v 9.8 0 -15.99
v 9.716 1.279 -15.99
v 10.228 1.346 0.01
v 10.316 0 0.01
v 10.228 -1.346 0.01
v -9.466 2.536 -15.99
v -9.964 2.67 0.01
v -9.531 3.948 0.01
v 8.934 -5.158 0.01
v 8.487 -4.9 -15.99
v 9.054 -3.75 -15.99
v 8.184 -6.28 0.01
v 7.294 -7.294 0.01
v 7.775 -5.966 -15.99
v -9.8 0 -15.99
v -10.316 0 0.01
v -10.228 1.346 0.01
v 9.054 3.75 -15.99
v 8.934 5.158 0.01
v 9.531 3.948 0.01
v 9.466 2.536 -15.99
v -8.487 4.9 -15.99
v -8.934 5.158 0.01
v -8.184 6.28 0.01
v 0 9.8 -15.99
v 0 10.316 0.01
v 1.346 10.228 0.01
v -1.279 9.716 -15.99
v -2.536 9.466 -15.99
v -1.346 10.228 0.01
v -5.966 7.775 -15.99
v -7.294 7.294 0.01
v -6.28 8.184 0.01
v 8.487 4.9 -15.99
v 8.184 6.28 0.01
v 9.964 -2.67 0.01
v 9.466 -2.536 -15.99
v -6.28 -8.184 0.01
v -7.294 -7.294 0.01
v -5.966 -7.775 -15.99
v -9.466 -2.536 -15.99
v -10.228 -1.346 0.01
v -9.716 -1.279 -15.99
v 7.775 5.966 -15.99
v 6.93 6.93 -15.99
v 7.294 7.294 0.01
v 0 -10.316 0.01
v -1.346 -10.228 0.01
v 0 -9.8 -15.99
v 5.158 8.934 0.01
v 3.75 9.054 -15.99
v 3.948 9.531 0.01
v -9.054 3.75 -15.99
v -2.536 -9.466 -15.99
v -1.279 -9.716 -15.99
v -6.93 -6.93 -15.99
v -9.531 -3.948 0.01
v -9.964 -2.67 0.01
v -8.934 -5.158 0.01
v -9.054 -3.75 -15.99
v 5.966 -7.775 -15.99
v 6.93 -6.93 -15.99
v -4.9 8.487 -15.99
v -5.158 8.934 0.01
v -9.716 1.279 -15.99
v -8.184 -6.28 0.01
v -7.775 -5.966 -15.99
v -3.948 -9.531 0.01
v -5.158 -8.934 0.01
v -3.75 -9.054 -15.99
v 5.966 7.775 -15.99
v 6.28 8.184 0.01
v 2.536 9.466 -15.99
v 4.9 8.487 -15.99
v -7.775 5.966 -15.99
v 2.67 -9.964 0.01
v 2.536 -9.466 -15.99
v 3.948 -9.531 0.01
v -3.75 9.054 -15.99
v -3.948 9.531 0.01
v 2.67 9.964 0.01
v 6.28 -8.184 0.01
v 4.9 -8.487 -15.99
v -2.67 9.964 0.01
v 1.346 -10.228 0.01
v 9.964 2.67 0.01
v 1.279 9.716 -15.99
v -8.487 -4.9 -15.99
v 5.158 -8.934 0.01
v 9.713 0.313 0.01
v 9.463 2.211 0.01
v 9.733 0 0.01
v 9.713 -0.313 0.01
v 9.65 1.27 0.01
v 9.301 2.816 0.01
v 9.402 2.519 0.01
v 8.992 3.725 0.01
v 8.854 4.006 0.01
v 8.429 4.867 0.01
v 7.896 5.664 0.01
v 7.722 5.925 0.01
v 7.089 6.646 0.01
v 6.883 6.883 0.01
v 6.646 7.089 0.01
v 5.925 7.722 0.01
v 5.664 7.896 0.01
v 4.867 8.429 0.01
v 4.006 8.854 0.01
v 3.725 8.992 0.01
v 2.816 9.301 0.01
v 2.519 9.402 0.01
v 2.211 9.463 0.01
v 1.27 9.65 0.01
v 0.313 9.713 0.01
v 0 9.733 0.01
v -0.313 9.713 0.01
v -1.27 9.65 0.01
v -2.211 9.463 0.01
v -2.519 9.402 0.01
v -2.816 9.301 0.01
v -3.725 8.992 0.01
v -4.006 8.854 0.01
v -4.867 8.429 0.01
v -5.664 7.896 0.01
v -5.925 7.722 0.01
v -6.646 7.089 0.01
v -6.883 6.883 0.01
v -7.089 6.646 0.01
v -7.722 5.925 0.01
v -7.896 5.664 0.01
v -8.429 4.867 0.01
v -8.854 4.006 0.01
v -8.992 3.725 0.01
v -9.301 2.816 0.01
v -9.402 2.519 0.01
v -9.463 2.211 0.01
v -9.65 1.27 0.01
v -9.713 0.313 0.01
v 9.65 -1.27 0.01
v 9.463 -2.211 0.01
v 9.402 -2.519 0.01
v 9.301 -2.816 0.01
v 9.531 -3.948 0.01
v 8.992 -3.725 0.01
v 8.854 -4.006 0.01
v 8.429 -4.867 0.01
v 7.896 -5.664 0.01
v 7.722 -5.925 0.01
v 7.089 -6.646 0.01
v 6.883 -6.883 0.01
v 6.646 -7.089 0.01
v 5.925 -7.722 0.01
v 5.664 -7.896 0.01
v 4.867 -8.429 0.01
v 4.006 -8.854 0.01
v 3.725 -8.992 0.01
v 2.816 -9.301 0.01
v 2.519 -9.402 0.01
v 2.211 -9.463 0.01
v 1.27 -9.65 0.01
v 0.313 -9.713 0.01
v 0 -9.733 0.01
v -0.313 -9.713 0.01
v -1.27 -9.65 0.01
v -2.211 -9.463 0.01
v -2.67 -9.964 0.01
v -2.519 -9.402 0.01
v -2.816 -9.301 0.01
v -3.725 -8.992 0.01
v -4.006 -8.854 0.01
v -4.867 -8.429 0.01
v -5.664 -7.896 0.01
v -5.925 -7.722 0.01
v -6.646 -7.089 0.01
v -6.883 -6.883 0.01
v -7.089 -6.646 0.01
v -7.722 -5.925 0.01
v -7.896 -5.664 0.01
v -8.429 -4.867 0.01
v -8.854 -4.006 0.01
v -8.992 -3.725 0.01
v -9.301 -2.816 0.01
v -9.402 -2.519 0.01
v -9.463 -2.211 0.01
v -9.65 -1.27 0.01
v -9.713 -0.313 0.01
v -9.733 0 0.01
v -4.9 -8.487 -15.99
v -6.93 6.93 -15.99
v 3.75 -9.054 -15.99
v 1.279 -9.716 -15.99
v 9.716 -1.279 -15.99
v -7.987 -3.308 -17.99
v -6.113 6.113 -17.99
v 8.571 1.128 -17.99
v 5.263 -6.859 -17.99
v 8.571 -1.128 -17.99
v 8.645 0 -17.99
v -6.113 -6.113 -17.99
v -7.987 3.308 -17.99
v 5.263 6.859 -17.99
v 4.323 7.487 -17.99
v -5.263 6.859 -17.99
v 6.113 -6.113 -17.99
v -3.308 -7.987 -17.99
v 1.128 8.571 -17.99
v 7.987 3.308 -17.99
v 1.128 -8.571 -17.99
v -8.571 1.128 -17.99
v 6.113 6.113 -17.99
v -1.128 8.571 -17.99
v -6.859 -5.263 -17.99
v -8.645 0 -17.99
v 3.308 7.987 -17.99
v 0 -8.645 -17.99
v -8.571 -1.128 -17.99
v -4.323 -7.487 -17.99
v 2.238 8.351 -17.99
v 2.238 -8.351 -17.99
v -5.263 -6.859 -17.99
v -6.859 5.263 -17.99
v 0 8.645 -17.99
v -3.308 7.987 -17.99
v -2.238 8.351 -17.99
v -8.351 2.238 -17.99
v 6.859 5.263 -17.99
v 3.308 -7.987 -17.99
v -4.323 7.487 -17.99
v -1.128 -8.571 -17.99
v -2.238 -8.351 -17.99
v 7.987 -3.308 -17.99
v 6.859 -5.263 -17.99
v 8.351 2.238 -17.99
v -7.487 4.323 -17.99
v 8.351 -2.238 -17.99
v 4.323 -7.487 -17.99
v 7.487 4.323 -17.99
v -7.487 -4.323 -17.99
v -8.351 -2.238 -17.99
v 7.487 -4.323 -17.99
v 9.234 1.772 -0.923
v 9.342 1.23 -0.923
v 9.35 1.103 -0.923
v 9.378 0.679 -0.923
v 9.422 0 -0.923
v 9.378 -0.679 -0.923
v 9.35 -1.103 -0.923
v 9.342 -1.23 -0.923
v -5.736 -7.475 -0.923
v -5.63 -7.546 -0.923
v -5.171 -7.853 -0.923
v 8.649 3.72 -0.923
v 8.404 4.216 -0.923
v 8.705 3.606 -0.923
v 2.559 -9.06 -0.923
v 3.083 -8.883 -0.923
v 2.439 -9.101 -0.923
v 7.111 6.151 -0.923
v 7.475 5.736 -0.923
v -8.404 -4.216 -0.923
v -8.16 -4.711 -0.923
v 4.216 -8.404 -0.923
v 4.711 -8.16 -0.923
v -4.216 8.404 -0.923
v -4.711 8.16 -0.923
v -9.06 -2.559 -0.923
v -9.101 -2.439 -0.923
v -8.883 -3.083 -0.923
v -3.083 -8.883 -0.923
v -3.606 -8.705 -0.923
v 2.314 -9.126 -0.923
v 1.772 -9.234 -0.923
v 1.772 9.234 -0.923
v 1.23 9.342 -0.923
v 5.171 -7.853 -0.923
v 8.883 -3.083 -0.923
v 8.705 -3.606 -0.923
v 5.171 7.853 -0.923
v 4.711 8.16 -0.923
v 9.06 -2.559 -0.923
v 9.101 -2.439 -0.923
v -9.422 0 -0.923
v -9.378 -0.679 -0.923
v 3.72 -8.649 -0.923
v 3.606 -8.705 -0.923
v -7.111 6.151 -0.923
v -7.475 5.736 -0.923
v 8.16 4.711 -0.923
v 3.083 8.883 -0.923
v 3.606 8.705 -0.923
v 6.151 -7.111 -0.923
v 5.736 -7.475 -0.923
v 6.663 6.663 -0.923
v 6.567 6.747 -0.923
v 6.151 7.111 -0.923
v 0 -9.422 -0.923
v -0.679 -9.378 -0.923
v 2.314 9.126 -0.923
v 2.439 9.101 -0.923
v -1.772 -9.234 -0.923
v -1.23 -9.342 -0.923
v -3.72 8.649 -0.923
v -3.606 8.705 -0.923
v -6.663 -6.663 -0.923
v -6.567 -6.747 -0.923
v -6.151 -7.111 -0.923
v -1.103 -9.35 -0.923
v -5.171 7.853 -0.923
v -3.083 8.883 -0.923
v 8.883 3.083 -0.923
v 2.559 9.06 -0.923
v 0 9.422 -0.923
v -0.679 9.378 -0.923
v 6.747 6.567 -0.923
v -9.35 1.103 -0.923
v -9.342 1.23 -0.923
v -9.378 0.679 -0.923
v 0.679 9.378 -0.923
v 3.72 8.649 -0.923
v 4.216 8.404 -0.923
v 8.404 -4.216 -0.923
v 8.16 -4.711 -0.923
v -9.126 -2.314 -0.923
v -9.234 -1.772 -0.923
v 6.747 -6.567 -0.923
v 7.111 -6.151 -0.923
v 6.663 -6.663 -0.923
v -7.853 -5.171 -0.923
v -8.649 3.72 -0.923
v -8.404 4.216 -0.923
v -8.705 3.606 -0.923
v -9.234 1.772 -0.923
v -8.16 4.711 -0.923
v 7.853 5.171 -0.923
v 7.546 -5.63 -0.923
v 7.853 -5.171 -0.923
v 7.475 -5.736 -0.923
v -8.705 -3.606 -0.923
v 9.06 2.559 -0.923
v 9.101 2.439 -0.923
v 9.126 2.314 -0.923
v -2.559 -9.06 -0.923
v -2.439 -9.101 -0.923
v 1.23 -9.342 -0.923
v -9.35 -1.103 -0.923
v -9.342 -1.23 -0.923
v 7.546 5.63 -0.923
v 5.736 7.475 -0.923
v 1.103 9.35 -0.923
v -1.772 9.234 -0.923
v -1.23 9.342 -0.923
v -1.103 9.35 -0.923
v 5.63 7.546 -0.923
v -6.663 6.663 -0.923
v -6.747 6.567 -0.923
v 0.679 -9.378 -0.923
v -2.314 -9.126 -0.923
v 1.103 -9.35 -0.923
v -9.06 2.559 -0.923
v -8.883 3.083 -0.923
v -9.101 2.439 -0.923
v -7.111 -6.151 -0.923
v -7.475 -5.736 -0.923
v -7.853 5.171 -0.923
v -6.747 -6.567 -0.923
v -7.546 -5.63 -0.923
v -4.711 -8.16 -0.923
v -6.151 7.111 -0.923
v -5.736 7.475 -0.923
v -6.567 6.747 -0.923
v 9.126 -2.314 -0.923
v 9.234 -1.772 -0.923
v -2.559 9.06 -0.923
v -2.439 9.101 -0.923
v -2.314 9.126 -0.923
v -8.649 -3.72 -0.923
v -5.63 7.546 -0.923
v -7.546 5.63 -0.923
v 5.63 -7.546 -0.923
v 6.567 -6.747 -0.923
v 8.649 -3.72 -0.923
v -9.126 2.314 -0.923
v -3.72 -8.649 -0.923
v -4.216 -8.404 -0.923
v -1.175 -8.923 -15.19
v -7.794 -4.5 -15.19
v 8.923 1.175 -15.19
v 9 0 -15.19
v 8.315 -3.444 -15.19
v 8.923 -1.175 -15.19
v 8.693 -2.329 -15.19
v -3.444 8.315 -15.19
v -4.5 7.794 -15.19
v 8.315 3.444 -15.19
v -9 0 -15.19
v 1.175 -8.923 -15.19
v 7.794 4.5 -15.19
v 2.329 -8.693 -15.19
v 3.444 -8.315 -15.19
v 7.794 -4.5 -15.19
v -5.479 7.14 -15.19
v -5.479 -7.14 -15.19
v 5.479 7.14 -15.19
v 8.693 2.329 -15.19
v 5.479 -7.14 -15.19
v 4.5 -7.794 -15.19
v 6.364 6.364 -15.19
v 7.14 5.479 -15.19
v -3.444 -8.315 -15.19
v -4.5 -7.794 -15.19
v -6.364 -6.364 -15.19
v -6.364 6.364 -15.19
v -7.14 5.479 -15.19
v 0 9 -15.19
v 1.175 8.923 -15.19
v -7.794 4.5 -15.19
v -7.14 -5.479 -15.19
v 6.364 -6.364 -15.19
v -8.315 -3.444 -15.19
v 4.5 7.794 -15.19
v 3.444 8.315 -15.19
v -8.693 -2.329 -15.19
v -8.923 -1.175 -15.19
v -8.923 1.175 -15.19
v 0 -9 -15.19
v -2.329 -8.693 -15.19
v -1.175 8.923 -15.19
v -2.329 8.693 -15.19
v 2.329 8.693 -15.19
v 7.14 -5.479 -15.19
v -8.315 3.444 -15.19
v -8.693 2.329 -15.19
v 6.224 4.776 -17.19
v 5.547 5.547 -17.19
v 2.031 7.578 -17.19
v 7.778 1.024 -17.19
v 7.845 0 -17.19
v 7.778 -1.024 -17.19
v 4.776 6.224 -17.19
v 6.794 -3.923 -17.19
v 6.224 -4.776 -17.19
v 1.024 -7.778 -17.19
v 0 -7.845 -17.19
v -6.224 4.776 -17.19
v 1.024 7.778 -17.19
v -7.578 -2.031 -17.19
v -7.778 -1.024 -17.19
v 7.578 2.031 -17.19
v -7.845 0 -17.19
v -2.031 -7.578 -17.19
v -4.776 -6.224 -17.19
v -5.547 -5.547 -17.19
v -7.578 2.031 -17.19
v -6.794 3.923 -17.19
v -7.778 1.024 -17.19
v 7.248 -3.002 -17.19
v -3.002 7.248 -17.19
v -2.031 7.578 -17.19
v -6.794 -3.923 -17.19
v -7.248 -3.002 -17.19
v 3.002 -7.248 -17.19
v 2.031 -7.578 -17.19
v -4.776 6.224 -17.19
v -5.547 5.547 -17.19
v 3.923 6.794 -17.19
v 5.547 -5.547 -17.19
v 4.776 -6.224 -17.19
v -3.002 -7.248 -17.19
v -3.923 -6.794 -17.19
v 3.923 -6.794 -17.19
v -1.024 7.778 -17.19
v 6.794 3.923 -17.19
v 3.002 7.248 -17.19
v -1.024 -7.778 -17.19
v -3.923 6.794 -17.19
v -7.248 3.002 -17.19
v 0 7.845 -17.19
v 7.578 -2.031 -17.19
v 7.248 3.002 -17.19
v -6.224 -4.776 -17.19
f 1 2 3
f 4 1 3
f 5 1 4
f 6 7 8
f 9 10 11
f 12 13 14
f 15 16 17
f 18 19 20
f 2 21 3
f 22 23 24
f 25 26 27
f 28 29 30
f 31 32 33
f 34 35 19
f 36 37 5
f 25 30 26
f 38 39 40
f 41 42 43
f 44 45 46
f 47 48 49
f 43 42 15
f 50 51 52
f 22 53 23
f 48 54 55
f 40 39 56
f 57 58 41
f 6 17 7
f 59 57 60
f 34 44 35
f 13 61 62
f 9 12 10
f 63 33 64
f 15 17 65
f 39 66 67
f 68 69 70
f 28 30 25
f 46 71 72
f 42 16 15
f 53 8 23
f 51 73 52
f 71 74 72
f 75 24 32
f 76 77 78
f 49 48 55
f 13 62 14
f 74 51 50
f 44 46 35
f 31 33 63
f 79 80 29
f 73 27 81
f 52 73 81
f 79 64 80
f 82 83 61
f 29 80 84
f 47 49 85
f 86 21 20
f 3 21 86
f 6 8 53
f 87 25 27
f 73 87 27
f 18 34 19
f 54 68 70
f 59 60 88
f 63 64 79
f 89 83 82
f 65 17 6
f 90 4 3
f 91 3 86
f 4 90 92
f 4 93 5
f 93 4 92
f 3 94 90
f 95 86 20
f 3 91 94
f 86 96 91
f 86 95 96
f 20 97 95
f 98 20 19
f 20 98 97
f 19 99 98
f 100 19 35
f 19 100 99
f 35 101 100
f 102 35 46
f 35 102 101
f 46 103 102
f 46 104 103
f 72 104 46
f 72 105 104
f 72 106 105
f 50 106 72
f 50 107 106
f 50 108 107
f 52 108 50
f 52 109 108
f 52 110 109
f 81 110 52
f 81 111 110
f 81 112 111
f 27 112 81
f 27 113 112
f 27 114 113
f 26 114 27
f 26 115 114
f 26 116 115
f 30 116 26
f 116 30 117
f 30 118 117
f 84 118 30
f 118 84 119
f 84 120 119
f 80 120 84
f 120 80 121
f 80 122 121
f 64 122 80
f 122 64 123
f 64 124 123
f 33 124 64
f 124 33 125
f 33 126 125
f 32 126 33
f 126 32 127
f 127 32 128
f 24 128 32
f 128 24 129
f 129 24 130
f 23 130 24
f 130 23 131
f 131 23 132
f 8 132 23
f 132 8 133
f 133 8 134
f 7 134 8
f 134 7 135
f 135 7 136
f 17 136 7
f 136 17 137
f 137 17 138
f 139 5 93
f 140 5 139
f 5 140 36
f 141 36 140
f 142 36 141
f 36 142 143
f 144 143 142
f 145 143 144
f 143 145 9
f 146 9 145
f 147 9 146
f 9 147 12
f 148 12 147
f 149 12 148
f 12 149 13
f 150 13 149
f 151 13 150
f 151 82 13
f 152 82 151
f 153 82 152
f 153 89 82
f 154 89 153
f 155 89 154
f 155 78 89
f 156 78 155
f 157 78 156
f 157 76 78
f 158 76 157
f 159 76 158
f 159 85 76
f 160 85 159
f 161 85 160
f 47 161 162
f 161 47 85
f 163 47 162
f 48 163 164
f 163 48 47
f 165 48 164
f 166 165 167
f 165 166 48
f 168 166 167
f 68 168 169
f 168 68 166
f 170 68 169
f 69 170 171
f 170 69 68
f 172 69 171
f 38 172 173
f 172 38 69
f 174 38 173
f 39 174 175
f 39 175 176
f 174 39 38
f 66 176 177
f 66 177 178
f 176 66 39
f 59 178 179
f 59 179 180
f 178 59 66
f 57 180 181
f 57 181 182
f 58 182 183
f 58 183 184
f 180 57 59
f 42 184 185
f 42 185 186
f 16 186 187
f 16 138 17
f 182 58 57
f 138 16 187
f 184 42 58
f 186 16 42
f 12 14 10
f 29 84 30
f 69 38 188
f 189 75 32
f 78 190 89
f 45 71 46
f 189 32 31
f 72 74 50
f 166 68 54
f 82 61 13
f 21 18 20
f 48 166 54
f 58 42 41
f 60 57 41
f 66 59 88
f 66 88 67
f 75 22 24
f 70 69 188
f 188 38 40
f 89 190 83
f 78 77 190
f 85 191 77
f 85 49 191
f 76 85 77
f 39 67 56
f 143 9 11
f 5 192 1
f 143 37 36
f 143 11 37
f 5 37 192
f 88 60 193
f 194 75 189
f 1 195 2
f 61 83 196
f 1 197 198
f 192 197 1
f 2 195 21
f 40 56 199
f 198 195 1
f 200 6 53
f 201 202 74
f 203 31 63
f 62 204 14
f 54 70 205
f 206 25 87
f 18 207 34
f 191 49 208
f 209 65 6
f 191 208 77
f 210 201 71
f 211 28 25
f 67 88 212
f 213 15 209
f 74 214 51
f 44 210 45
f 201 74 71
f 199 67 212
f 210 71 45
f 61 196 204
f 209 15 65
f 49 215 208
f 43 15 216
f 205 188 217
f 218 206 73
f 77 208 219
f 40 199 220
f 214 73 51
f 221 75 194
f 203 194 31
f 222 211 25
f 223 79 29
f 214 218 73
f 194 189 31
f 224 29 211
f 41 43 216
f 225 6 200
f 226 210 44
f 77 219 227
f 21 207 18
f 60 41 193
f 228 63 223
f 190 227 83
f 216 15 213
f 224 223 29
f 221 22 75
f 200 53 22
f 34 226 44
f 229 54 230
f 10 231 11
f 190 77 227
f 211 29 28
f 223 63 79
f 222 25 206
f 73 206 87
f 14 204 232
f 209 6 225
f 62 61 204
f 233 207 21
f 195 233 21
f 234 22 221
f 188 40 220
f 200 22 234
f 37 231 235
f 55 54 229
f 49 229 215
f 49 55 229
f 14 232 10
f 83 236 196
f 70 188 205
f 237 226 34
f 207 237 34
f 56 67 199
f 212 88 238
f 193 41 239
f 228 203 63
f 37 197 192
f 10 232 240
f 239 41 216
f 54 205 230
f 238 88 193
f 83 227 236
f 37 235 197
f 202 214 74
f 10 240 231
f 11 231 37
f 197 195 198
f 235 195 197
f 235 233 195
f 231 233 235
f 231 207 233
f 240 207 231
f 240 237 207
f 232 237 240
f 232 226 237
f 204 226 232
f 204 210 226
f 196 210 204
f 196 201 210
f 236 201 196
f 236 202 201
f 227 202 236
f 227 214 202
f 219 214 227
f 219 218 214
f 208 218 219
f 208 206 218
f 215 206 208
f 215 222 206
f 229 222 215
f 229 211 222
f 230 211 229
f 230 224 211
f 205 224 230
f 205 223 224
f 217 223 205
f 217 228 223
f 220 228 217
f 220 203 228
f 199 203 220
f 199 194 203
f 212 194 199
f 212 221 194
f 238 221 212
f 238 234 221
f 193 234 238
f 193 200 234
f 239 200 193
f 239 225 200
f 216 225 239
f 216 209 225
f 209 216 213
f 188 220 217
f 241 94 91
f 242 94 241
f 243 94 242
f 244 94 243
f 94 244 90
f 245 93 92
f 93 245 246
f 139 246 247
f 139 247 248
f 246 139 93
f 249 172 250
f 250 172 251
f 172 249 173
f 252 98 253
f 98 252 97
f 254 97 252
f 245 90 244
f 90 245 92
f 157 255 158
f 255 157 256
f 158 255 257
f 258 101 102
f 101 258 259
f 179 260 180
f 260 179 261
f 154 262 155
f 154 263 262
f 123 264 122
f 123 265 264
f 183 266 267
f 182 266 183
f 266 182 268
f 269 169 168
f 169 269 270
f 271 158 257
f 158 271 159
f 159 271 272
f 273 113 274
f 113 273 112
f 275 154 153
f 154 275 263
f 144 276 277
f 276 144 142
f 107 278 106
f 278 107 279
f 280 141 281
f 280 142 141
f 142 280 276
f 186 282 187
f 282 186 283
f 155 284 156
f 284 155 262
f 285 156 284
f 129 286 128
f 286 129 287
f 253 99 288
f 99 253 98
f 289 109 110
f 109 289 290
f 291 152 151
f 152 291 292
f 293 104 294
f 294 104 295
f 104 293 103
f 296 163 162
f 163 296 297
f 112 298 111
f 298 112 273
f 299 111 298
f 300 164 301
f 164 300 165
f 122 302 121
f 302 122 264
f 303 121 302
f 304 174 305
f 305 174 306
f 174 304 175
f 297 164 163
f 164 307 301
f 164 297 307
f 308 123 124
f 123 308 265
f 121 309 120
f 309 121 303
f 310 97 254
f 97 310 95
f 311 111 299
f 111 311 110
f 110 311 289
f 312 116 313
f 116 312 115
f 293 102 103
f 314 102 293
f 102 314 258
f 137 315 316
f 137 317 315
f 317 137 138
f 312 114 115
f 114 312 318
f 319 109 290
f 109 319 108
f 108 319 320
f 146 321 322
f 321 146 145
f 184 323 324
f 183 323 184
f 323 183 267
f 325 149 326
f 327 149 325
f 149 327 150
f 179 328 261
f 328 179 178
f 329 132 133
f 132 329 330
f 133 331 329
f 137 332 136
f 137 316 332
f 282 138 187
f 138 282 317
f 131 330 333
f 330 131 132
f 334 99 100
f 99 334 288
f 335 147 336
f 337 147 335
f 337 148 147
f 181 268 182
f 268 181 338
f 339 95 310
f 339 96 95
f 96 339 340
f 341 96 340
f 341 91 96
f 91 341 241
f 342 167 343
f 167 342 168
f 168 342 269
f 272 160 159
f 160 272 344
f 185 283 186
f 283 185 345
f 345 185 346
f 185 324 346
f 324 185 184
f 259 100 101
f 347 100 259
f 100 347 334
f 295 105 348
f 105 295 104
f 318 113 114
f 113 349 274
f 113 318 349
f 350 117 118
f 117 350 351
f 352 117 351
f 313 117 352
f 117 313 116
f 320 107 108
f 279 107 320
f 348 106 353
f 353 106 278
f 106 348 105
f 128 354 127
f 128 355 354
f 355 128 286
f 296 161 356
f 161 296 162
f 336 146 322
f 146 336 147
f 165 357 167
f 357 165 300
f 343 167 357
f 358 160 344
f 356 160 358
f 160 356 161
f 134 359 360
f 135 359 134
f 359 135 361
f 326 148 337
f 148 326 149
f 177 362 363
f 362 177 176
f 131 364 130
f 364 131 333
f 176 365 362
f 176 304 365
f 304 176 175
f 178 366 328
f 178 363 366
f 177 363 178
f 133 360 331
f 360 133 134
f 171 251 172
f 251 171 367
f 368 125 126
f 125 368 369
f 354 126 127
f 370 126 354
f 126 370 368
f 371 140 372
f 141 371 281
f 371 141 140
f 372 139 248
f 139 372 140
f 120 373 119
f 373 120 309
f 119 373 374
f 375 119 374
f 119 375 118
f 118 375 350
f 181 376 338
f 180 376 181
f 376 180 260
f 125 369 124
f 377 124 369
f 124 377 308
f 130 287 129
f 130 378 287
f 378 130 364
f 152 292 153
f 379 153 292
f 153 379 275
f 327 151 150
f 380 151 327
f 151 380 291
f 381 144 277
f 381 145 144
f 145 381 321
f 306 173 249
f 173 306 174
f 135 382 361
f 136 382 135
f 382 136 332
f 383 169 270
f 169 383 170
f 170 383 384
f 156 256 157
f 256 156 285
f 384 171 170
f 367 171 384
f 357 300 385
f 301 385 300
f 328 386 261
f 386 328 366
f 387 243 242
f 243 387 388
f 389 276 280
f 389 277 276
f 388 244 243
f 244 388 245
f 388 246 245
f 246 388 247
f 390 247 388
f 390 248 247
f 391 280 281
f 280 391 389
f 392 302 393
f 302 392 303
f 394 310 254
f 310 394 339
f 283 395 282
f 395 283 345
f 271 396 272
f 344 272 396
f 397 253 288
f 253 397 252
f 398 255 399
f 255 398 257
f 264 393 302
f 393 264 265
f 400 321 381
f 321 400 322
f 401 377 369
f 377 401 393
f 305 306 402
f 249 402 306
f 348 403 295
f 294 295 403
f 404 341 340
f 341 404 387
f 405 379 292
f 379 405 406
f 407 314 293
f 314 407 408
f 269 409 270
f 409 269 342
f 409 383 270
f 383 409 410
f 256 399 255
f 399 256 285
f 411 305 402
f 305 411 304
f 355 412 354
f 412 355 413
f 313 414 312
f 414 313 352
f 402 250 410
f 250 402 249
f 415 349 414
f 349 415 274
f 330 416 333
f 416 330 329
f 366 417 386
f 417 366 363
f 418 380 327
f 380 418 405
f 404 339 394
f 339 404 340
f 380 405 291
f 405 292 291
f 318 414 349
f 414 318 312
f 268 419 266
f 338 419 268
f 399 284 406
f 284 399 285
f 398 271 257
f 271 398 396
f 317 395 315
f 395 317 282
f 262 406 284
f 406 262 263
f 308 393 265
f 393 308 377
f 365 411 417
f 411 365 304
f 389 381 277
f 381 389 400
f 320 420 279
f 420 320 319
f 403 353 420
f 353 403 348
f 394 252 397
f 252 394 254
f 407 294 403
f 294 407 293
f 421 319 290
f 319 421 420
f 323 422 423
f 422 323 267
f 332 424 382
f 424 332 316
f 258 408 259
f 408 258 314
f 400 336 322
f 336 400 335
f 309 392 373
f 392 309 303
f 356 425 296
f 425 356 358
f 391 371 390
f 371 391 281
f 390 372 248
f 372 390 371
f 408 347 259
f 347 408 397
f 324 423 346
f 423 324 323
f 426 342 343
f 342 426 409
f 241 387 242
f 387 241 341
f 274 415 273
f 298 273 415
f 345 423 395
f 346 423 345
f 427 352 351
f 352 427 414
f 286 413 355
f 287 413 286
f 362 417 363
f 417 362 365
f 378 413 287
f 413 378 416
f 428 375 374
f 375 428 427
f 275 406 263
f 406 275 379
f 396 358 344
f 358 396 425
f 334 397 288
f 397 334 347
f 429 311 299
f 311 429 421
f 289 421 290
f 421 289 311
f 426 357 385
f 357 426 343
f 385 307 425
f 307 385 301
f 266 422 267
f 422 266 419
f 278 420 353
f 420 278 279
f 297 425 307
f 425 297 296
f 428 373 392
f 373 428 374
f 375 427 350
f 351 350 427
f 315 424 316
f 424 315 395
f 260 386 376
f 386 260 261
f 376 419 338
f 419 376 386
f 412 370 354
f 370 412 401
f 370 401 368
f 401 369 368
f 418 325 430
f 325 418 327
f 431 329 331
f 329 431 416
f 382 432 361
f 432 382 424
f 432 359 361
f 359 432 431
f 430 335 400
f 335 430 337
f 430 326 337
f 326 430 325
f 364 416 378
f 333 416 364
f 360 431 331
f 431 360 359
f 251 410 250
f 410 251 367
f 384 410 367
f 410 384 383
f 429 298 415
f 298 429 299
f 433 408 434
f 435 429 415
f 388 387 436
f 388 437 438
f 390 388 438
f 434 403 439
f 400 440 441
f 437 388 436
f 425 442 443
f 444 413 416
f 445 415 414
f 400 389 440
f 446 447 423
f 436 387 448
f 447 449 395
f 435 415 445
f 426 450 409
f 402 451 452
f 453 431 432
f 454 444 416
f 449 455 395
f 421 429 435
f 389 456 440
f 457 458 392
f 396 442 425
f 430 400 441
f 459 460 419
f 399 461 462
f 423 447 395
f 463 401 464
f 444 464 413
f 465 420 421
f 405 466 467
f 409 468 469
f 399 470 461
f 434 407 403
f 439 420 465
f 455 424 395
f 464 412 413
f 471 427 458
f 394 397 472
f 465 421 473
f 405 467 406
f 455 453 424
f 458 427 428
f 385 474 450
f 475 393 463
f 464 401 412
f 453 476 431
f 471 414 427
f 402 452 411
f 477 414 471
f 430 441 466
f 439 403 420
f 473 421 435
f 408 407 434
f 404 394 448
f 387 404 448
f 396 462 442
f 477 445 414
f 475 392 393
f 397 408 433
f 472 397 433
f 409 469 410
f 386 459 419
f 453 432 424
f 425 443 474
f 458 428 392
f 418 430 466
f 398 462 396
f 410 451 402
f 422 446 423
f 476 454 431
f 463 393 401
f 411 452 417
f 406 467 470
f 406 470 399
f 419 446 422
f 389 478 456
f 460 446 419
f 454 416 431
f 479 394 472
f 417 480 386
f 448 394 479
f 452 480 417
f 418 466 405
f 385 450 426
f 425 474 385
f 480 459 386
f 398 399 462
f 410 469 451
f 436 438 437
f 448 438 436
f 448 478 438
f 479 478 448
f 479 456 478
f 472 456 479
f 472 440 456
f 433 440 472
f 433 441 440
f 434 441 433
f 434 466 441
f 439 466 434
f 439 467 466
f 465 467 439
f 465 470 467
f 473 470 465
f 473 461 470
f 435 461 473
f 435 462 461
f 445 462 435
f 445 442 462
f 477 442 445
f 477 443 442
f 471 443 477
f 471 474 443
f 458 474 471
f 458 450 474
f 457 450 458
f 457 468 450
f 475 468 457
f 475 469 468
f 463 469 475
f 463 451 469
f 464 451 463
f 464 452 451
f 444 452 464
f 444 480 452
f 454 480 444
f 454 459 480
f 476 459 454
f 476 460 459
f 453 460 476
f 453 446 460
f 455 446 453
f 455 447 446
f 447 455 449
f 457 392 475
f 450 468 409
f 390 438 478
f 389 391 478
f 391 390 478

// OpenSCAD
// Fingerhut / thimble
//
// Andreas Merz 2021-01-06, v0.1 
// GPLv3 or later, see http://www.gnu.org/licenses


// Main dimensions
rin=18.0/2;      // inner width
zin=16;          // inner height
wall=0.8;        // wall thickness of printed part
//clr=0.4;       // clearance

//-------------------------------------------
// cone+cylinder
//-------------------------------------------

module ccyl(h0=0, h1=wall, h2=wall, r1=rin, ang=-45, h3=0) {
    s0=0.9;
    s1=0.95;   // h1 cone
    ss=(r1-h2*tan(ang))/r1;
    rotate([-90,0,0]) translate([0,0,-0.01])
    union() {
      linear_extrude(height=h0, scale=s0)  circle(r=r1/s0,$fn=48);
      linear_extrude(height=h1, scale=s1)  circle(r=r1/s1,$fn=48);
      translate([0,0,h1])
        linear_extrude(height=h2, scale=ss) circle(r=r1, $fn=48);
      translate([0,0,h1+h2])
        linear_extrude(height=h3, scale=1) circle(r=r1*ss, $fn=48);
    }
}

module fingerhutA(d=2*rin, l=zin) {
  rotate([180,0,0])
  difference()  {
    rotate([90,0,0]) ccyl(r1=d/2+wall, h1=zin, h2=2, ang=30, h3=0);
    translate([0,0,-wall])
      rotate([90,0,0]) ccyl(r1=d/2,    h0=3, h1=zin, h2=2, ang=30, h3=0);
  }
}


//------------- Instances --------------------
// test-Schnitt
//  difference()  {
fingerhutA();
//    translate([0,0,-30]) cube(40);  }
